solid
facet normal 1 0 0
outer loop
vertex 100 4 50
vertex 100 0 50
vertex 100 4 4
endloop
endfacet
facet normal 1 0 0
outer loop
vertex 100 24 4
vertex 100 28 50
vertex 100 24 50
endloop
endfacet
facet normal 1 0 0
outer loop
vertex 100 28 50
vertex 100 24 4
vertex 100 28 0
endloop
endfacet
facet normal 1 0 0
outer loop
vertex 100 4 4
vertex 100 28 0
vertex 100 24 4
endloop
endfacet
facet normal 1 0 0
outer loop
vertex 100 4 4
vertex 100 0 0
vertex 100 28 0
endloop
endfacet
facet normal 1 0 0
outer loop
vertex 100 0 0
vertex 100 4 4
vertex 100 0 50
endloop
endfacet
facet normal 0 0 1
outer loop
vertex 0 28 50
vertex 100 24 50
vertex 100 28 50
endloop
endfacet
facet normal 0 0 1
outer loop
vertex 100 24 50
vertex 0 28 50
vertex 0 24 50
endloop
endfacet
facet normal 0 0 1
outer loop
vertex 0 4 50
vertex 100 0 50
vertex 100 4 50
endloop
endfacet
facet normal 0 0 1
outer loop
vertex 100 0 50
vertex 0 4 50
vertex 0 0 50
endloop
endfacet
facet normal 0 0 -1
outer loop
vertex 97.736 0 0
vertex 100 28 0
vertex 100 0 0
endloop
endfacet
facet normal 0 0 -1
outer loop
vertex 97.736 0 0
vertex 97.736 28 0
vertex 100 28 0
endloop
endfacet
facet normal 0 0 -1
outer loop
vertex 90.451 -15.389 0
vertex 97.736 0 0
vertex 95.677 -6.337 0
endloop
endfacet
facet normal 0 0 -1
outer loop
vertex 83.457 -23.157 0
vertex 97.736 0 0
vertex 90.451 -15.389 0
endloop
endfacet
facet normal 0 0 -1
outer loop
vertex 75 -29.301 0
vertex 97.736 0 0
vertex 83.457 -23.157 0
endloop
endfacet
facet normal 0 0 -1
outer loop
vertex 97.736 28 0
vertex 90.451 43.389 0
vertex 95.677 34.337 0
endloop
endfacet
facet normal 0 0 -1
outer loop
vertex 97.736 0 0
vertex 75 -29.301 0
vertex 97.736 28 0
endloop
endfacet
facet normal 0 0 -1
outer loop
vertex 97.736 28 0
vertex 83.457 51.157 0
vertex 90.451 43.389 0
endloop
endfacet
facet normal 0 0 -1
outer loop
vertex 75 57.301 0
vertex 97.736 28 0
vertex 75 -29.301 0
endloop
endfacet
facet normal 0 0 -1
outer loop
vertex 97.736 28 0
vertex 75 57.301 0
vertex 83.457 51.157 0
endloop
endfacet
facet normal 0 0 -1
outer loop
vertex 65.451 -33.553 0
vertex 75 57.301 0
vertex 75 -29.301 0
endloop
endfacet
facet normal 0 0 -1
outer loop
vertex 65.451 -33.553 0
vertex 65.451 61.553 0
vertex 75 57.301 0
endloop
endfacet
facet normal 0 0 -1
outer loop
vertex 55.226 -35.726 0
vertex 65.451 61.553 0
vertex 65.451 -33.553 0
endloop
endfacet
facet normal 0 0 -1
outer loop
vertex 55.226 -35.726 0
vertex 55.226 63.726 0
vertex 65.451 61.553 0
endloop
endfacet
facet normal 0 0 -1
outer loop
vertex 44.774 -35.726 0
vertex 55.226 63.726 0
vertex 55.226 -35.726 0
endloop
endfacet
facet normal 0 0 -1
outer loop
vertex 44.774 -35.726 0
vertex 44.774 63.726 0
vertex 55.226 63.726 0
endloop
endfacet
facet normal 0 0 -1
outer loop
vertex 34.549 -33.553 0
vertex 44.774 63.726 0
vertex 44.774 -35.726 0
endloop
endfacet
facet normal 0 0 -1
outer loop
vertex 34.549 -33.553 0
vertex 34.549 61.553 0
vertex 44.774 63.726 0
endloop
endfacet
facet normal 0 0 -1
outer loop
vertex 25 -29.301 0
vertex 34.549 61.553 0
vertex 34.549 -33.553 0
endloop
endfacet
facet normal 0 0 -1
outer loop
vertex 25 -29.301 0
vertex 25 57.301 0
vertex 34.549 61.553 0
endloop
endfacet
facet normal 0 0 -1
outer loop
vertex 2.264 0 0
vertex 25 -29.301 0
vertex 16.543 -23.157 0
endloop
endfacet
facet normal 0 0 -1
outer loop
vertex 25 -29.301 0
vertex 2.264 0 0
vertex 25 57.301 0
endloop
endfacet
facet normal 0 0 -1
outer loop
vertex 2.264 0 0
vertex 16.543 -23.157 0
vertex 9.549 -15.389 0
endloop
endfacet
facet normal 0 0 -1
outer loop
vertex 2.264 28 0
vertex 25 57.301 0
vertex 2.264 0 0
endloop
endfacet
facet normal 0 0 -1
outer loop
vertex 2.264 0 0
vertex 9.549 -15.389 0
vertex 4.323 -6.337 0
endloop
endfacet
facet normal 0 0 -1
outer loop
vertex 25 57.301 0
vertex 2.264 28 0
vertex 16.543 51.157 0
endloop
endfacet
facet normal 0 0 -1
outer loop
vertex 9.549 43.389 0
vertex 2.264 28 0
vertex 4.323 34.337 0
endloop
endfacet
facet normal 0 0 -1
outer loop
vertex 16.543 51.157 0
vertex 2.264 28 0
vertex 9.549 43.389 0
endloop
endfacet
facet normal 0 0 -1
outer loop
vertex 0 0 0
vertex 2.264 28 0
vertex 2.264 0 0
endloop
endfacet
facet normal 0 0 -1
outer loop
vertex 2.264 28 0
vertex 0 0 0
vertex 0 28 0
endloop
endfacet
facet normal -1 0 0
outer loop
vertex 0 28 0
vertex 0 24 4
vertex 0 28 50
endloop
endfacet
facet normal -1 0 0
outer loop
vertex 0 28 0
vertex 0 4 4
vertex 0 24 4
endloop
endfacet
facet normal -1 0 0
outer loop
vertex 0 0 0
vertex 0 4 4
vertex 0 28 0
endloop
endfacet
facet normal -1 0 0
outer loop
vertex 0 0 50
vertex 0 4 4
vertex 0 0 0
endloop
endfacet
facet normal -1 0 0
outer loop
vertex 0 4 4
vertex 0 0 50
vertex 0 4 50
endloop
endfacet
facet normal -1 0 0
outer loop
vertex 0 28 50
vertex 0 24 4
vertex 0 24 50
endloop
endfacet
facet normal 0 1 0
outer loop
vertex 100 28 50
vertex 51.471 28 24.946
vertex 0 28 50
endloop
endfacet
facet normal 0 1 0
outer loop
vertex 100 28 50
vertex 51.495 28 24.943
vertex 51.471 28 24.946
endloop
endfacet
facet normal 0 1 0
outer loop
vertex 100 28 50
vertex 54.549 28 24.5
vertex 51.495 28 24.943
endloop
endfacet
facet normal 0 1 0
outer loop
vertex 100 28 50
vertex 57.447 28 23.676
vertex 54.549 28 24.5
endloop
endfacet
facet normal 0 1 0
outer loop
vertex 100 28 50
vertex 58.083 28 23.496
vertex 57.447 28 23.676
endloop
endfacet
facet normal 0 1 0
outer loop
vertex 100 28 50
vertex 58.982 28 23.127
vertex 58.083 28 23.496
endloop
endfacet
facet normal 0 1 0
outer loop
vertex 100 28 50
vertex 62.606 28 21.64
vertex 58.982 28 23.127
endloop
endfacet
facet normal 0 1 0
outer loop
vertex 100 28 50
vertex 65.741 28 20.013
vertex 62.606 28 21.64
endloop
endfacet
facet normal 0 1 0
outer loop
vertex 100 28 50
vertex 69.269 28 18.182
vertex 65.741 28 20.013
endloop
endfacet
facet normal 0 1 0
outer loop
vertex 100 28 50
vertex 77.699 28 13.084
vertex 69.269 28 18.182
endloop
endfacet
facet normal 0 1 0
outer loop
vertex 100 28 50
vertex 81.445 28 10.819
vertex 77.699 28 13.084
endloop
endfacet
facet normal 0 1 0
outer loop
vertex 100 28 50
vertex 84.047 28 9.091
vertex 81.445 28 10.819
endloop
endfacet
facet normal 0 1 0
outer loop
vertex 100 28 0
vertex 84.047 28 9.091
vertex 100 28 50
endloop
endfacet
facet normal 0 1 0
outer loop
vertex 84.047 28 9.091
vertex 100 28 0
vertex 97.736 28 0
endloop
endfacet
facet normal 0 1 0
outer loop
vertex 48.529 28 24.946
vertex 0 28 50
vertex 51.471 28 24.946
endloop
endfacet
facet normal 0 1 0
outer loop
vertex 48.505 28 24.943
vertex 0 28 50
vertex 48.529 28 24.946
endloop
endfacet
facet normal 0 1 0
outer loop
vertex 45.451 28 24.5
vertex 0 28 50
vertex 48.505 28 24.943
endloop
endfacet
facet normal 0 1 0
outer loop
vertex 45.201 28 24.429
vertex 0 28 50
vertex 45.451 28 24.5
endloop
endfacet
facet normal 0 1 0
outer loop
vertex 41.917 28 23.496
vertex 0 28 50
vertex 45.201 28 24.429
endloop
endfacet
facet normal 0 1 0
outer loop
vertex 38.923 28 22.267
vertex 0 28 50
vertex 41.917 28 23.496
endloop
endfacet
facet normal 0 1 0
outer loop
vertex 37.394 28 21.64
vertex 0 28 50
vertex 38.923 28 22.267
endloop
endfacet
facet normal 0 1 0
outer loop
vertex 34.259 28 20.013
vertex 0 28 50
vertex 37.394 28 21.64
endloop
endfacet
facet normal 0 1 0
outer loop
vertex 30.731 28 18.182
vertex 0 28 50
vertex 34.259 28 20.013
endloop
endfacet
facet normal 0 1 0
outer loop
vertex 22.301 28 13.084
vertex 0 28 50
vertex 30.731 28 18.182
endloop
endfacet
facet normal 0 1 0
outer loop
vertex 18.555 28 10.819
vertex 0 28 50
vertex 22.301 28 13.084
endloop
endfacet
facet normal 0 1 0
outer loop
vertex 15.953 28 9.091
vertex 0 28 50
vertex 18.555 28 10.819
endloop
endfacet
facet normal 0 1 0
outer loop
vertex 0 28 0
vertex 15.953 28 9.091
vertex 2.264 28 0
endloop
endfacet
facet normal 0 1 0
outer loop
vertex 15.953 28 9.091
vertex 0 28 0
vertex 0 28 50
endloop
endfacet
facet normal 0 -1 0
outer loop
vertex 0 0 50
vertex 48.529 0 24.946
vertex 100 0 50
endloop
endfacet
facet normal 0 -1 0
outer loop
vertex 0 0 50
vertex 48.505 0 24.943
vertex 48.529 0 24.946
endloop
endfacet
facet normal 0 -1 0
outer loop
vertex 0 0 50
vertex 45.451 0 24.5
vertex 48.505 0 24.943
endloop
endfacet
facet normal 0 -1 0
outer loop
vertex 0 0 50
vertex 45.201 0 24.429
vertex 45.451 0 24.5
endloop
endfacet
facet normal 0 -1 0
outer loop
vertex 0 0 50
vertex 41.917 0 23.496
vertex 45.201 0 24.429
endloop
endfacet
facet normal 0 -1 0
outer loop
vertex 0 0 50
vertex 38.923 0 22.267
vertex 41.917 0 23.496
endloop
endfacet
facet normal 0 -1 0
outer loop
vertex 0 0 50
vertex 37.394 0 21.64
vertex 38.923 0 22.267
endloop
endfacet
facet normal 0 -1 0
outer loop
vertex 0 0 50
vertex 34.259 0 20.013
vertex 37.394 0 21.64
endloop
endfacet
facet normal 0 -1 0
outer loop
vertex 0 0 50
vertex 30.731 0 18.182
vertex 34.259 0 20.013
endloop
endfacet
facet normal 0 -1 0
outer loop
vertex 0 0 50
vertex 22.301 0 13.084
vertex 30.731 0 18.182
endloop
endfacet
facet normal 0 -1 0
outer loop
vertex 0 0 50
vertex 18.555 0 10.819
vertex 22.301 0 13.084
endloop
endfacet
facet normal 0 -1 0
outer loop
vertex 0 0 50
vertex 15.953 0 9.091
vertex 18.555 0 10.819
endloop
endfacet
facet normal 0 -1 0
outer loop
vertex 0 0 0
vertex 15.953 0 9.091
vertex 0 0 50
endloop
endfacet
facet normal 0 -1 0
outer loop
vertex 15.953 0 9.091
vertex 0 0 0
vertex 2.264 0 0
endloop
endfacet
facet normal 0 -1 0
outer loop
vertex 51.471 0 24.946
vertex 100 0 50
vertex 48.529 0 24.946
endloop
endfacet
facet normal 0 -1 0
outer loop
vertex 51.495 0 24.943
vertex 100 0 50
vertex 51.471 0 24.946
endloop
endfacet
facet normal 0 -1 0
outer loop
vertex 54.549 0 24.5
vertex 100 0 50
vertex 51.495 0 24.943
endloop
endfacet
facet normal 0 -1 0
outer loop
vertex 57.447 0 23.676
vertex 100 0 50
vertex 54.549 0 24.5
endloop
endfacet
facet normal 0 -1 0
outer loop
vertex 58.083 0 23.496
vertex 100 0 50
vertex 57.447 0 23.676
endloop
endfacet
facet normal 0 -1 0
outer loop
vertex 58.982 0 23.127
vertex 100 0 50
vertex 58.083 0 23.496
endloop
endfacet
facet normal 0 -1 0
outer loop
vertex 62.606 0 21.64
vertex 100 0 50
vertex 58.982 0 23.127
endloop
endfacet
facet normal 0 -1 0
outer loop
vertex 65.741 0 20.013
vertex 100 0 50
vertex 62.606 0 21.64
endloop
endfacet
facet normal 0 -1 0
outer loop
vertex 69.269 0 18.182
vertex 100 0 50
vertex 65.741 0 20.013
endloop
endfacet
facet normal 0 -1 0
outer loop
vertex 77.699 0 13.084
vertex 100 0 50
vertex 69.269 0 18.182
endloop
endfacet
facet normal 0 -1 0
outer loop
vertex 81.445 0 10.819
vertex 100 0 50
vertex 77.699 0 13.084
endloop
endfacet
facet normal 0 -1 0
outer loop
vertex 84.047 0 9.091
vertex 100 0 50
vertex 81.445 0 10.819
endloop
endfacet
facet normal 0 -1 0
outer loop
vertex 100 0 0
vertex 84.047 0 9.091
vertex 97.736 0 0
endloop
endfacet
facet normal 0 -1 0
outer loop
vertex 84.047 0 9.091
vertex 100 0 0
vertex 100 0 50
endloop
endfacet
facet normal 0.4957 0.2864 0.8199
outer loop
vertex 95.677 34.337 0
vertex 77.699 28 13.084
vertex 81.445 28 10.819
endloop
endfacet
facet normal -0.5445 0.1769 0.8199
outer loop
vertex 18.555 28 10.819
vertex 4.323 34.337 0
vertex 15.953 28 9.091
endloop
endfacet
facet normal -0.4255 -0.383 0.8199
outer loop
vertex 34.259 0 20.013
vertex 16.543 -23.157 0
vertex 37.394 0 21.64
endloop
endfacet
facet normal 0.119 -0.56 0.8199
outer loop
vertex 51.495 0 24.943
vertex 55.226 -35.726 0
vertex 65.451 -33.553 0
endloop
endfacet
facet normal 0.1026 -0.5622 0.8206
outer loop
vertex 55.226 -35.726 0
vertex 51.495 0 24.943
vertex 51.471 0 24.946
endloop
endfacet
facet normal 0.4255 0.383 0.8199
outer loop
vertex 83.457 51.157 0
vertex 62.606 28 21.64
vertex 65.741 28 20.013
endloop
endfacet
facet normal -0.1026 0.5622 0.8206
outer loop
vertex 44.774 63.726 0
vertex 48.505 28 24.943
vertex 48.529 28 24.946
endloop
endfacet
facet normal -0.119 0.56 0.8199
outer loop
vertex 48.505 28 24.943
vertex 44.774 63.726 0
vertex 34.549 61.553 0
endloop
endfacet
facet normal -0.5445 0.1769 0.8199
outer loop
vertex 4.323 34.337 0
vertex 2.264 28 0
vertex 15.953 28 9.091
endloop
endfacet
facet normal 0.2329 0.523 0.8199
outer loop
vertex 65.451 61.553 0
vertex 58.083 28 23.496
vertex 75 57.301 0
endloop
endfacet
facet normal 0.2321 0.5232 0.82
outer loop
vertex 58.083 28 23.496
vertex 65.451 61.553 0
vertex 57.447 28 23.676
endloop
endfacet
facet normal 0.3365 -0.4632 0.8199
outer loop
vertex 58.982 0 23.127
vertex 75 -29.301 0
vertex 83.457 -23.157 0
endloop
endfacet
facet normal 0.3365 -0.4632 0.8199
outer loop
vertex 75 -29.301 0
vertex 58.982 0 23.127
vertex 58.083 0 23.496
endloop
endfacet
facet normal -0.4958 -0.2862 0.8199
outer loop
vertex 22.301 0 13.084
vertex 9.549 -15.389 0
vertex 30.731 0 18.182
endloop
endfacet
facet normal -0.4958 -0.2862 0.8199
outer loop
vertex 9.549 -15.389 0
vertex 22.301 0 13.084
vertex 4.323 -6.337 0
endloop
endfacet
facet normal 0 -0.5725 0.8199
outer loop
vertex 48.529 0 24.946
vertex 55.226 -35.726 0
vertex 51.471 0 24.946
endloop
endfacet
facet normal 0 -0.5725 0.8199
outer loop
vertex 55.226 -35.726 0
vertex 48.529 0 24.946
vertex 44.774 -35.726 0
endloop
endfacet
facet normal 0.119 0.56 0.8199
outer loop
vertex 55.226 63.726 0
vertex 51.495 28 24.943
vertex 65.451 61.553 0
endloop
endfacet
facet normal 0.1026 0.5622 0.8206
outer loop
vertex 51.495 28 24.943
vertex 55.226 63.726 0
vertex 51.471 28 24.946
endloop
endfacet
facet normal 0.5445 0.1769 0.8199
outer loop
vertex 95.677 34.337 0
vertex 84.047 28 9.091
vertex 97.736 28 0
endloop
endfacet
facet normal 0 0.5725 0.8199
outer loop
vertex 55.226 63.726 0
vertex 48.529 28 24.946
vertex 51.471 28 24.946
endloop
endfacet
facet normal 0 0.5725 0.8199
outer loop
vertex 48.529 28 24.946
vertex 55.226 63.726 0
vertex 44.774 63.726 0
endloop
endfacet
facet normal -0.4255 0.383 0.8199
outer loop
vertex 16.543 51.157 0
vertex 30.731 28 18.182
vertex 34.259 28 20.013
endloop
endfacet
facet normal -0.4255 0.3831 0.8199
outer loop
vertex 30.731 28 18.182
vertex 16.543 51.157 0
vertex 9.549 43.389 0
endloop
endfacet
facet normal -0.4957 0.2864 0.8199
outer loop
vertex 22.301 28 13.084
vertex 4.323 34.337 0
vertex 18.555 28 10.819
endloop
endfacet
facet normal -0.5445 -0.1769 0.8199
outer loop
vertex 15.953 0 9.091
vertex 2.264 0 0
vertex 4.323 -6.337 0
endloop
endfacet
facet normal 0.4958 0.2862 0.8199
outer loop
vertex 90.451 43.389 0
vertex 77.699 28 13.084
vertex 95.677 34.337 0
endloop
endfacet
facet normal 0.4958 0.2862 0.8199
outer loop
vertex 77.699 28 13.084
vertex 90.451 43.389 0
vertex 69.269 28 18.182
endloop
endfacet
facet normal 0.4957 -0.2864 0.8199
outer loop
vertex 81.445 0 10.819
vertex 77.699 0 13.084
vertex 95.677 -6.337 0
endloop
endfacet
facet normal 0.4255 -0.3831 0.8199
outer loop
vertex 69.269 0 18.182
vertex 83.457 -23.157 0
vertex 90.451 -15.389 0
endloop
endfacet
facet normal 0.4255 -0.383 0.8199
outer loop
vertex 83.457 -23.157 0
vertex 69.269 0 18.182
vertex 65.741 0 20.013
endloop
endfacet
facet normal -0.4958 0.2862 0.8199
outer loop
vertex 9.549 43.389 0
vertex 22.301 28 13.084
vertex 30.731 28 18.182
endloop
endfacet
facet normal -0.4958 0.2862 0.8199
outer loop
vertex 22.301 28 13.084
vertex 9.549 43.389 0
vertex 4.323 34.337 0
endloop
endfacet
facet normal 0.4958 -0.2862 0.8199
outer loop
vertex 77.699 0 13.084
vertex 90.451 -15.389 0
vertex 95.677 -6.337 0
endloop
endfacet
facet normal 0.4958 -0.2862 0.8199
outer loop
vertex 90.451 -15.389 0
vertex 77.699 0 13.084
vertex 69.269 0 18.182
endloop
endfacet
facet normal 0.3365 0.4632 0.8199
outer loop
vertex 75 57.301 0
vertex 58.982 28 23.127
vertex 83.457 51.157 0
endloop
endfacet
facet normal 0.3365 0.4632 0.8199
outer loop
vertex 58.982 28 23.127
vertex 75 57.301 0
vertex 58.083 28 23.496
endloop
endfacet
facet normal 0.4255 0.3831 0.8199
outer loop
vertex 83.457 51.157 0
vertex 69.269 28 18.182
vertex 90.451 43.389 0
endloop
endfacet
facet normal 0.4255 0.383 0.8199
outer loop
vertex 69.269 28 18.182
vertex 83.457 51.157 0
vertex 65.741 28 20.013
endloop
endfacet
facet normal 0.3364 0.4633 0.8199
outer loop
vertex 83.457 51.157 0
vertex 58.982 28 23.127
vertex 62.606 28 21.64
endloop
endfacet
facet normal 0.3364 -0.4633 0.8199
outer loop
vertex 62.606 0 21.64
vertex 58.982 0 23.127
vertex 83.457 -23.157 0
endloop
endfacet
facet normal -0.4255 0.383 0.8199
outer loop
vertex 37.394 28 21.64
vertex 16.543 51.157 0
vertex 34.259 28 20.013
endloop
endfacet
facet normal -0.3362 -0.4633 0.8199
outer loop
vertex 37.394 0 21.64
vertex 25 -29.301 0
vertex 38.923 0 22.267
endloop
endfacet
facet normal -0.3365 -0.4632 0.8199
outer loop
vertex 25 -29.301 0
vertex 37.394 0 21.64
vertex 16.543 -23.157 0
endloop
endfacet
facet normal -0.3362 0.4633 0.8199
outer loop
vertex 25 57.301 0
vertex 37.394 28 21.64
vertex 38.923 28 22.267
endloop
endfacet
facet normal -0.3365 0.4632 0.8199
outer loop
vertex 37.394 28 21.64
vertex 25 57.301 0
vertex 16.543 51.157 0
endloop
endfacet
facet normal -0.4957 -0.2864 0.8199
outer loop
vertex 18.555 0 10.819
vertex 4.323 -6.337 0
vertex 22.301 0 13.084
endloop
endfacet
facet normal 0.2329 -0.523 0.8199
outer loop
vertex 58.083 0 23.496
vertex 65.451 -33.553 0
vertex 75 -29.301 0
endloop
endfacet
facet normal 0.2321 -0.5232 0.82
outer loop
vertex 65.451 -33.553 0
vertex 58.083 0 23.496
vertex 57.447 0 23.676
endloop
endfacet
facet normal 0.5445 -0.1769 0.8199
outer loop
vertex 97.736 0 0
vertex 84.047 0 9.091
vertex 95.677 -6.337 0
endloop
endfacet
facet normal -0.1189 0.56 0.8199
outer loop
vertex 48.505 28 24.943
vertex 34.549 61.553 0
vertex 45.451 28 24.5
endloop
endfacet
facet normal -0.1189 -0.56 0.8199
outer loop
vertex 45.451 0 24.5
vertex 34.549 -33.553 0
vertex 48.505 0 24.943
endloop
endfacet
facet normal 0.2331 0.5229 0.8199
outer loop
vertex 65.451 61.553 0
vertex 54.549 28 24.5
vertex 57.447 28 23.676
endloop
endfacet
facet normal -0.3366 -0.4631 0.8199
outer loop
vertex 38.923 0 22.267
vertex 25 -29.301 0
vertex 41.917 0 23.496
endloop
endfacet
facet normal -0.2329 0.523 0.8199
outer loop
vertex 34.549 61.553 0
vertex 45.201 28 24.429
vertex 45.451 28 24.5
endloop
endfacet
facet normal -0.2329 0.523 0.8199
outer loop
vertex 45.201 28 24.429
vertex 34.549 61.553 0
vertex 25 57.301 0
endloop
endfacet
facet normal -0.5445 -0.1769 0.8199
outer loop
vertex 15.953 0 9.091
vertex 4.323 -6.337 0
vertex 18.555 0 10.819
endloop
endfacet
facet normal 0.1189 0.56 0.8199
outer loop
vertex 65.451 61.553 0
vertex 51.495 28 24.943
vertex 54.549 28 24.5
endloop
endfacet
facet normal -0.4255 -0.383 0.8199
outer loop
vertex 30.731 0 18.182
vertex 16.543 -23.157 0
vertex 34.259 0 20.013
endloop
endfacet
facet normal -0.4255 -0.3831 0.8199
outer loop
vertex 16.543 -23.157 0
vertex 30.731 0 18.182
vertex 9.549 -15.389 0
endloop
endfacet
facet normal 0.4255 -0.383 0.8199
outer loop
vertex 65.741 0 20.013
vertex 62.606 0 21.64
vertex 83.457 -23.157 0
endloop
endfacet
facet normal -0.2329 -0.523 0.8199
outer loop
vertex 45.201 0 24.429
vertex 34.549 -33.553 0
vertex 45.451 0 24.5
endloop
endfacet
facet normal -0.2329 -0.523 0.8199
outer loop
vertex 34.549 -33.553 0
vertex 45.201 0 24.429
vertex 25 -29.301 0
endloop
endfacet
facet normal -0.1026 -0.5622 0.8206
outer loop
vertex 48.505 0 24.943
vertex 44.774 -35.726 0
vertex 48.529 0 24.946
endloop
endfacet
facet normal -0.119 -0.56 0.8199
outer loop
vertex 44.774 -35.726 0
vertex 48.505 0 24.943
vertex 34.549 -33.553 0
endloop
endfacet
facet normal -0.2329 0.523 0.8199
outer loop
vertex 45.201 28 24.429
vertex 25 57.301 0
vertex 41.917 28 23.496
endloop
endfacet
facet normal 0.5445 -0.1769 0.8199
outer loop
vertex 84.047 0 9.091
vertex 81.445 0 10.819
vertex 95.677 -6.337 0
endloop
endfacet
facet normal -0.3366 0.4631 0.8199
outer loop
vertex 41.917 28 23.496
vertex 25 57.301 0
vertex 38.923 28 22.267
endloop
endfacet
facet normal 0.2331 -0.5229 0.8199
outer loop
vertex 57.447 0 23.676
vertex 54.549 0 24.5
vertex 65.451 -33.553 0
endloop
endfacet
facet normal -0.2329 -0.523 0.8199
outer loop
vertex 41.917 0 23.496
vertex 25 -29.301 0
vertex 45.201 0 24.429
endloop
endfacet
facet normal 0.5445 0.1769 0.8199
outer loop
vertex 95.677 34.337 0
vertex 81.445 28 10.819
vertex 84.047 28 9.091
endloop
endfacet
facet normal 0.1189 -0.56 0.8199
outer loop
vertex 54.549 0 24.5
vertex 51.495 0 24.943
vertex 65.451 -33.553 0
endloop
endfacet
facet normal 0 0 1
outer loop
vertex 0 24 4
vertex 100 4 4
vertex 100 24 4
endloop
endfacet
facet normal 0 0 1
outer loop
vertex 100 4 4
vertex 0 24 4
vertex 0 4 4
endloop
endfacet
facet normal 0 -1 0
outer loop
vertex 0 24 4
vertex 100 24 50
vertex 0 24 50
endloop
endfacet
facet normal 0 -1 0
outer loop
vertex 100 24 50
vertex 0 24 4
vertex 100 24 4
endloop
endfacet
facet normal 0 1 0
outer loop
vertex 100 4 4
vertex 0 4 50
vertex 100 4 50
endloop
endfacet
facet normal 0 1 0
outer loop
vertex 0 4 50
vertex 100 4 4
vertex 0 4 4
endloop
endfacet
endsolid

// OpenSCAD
laptopThickness = 20;
length = 100;
thickness = 4;
height = 50;

difference(){
    union(){
        cube([length, laptopThickness + thickness*2, height]);
        translate([length/2, laptopThickness/2 + thickness, 0]) {
            cylinder(height/2, length/2, laptopThickness/2 + thickness, 0);
        }
    }
    translate([-thickness, thickness, thickness]) {
        cube([length+thickness*2, laptopThickness, height]);
    }
}
